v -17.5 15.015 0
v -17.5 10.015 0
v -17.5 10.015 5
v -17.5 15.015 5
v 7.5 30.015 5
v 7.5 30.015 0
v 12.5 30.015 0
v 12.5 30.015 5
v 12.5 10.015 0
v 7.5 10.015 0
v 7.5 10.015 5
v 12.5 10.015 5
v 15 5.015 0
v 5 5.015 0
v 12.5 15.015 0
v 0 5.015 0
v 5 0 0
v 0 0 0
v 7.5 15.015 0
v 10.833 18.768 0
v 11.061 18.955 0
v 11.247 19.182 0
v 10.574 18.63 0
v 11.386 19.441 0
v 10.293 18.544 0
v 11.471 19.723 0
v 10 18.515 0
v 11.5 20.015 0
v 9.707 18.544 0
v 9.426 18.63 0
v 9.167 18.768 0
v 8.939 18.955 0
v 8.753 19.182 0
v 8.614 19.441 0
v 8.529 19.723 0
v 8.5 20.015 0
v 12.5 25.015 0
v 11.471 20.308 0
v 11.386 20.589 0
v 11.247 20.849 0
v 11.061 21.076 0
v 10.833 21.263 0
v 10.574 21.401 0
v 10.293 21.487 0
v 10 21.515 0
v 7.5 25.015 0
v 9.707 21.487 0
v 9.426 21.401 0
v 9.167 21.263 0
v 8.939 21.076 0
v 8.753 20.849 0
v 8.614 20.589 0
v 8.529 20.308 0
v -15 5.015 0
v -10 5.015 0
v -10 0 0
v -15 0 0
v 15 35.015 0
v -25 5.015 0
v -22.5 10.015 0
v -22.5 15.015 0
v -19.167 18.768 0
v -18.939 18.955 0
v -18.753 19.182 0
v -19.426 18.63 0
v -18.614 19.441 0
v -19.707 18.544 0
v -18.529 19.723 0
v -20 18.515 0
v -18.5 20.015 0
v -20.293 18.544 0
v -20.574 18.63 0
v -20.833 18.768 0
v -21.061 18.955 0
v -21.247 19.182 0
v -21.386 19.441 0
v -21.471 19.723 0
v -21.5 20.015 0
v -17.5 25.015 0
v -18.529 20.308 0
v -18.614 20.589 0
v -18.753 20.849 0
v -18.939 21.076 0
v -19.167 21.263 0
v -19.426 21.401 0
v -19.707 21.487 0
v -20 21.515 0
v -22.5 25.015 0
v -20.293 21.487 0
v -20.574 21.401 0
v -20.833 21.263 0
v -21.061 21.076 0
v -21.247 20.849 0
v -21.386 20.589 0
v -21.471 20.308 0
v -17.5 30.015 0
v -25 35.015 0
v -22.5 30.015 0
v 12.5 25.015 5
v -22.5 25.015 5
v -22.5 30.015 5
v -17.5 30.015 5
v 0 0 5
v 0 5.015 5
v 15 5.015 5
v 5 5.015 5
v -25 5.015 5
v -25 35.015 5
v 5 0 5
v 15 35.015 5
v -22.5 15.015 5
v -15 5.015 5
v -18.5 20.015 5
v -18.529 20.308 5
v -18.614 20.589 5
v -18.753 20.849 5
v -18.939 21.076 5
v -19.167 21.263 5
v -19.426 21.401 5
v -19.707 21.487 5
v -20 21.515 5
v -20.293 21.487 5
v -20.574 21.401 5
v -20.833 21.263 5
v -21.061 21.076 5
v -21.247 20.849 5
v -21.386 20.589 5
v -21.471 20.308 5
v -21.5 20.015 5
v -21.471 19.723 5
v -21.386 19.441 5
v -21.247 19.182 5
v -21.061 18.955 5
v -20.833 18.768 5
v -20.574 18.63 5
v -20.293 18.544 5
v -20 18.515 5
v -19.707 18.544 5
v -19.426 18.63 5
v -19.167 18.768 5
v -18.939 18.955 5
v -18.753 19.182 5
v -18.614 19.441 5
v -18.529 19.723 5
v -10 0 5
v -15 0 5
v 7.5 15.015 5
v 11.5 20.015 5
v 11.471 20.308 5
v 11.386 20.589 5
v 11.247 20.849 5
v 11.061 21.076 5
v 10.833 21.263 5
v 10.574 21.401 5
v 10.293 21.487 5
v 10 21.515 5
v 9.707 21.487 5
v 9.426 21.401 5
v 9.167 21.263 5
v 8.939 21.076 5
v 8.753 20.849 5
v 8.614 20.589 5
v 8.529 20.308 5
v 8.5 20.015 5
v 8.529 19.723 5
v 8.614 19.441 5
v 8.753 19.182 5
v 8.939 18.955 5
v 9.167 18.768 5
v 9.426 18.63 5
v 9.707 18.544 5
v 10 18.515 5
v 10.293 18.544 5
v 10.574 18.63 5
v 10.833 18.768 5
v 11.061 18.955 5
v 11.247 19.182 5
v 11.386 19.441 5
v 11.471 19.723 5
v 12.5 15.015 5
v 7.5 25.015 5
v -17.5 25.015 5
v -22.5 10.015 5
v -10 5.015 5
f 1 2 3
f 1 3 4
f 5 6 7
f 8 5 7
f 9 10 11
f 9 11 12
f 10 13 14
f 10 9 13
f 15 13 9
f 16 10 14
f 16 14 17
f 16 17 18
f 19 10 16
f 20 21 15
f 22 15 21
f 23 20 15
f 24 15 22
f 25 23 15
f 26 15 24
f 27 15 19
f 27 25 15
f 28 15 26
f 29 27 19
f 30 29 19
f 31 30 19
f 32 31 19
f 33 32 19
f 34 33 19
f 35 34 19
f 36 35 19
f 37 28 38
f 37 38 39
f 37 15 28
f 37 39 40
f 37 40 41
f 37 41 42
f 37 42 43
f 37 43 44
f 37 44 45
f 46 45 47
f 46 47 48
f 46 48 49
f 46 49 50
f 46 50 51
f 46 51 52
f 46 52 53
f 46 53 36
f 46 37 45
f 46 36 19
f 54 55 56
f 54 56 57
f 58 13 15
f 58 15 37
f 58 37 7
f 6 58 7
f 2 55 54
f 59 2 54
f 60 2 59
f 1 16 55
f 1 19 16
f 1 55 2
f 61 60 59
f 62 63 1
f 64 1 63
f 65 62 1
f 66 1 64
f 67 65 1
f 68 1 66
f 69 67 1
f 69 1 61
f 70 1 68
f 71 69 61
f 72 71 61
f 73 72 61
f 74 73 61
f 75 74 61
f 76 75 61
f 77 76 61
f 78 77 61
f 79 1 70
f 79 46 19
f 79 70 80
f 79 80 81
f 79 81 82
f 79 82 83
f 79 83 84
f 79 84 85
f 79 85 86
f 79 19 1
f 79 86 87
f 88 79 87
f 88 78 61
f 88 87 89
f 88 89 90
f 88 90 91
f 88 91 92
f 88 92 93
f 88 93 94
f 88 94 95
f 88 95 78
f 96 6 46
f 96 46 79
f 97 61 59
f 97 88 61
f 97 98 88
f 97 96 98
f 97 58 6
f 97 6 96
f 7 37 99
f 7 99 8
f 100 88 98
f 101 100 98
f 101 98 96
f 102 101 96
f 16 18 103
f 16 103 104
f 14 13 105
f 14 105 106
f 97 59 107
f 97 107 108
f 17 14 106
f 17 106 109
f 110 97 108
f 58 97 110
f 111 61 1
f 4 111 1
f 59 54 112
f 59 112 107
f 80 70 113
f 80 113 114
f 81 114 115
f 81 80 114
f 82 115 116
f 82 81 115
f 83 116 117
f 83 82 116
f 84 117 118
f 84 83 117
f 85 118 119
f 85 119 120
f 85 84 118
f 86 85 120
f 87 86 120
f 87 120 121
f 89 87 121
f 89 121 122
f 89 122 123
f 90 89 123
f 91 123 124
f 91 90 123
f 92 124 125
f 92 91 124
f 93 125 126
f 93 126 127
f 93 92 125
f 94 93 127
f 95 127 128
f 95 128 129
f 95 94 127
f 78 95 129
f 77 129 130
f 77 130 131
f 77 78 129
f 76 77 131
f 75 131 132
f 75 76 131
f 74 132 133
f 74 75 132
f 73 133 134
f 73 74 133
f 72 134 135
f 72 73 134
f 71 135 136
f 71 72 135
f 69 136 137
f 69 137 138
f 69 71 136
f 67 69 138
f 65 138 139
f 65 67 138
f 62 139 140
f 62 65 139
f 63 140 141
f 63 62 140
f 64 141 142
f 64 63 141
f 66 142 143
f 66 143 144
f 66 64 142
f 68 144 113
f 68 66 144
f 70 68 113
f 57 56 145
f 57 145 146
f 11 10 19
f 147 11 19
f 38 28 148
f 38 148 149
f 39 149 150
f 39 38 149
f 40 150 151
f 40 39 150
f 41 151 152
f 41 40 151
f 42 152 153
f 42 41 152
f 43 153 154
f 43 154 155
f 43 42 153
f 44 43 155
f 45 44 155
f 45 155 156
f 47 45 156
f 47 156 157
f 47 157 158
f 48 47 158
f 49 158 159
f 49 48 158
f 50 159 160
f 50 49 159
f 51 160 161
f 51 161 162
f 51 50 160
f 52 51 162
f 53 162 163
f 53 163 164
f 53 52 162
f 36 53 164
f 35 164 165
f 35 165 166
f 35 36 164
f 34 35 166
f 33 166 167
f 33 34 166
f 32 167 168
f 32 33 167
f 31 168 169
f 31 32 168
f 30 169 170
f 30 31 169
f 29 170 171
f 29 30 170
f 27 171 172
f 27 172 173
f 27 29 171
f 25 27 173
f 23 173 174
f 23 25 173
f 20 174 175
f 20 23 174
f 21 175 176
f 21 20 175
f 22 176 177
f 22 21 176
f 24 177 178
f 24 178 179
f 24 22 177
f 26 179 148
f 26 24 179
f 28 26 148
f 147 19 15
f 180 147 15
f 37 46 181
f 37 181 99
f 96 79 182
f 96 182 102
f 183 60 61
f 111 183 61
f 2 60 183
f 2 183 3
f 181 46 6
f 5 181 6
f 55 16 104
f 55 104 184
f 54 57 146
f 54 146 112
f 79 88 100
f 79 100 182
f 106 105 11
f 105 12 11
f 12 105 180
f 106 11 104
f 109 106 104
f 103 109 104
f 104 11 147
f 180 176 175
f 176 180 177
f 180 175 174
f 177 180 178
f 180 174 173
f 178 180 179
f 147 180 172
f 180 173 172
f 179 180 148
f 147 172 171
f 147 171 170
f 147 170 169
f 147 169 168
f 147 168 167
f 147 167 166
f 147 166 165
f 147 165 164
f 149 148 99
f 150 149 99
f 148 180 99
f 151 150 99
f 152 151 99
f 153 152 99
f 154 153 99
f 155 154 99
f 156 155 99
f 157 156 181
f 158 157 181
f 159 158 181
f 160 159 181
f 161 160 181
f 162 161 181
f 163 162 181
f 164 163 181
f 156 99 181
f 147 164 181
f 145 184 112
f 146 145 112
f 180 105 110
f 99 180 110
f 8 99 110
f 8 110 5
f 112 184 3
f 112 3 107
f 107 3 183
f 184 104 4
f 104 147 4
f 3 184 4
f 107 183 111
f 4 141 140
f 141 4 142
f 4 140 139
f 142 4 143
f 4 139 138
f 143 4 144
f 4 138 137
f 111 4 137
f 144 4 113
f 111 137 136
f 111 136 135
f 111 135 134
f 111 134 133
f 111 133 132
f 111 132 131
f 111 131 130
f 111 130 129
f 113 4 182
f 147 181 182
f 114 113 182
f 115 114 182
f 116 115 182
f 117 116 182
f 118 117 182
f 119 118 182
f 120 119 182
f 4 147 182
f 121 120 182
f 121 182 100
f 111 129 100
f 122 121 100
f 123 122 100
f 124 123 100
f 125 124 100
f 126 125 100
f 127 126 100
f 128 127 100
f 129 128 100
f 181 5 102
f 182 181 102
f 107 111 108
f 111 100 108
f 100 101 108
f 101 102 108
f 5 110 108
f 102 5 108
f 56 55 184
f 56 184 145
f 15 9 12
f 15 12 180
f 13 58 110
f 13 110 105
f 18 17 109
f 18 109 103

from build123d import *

# Parameters (mm, degrees)
SKETCH1_R           = 1.5
SKETCH1_W           = 5
SKETCH1_H           = 5
BOSS_EXTRUDE1_DEPTH = 5


with BuildPart() as part:
    # Sketch1 → Boss-Extrude1 (new body)
    with BuildSketch(Plane.XY):
        Polygon((0, 0), (0, 5.015390442), (-10, 5.015390442), (-10, 0), (-15, 0), (-15, 5.015390442), (-25, 5.015390442), (-25, 35.015390442), (15, 35.015390442), (15, 5.015390442), (5, 5.015390442), (5, 0), align=None)
        with Locations((-20, 20.015390442)):
            Circle(SKETCH1_R, mode=Mode.SUBTRACT)
        with Locations((10, 20.015390442)):
            Circle(SKETCH1_R, mode=Mode.SUBTRACT)
        with Locations((-20, 12.515390442)):
            Rectangle(SKETCH1_W, SKETCH1_H, mode=Mode.SUBTRACT)
        with Locations((-20, 27.515390442)):
            Rectangle(SKETCH1_W, SKETCH1_H, mode=Mode.SUBTRACT)
        with Locations((10, 12.515390442)):
            Rectangle(SKETCH1_W, SKETCH1_H, mode=Mode.SUBTRACT)
        with Locations((10, 27.515390442)):
            Rectangle(SKETCH1_W, SKETCH1_H, mode=Mode.SUBTRACT)
    extrude(amount=BOSS_EXTRUDE1_DEPTH)


solid = part.part
